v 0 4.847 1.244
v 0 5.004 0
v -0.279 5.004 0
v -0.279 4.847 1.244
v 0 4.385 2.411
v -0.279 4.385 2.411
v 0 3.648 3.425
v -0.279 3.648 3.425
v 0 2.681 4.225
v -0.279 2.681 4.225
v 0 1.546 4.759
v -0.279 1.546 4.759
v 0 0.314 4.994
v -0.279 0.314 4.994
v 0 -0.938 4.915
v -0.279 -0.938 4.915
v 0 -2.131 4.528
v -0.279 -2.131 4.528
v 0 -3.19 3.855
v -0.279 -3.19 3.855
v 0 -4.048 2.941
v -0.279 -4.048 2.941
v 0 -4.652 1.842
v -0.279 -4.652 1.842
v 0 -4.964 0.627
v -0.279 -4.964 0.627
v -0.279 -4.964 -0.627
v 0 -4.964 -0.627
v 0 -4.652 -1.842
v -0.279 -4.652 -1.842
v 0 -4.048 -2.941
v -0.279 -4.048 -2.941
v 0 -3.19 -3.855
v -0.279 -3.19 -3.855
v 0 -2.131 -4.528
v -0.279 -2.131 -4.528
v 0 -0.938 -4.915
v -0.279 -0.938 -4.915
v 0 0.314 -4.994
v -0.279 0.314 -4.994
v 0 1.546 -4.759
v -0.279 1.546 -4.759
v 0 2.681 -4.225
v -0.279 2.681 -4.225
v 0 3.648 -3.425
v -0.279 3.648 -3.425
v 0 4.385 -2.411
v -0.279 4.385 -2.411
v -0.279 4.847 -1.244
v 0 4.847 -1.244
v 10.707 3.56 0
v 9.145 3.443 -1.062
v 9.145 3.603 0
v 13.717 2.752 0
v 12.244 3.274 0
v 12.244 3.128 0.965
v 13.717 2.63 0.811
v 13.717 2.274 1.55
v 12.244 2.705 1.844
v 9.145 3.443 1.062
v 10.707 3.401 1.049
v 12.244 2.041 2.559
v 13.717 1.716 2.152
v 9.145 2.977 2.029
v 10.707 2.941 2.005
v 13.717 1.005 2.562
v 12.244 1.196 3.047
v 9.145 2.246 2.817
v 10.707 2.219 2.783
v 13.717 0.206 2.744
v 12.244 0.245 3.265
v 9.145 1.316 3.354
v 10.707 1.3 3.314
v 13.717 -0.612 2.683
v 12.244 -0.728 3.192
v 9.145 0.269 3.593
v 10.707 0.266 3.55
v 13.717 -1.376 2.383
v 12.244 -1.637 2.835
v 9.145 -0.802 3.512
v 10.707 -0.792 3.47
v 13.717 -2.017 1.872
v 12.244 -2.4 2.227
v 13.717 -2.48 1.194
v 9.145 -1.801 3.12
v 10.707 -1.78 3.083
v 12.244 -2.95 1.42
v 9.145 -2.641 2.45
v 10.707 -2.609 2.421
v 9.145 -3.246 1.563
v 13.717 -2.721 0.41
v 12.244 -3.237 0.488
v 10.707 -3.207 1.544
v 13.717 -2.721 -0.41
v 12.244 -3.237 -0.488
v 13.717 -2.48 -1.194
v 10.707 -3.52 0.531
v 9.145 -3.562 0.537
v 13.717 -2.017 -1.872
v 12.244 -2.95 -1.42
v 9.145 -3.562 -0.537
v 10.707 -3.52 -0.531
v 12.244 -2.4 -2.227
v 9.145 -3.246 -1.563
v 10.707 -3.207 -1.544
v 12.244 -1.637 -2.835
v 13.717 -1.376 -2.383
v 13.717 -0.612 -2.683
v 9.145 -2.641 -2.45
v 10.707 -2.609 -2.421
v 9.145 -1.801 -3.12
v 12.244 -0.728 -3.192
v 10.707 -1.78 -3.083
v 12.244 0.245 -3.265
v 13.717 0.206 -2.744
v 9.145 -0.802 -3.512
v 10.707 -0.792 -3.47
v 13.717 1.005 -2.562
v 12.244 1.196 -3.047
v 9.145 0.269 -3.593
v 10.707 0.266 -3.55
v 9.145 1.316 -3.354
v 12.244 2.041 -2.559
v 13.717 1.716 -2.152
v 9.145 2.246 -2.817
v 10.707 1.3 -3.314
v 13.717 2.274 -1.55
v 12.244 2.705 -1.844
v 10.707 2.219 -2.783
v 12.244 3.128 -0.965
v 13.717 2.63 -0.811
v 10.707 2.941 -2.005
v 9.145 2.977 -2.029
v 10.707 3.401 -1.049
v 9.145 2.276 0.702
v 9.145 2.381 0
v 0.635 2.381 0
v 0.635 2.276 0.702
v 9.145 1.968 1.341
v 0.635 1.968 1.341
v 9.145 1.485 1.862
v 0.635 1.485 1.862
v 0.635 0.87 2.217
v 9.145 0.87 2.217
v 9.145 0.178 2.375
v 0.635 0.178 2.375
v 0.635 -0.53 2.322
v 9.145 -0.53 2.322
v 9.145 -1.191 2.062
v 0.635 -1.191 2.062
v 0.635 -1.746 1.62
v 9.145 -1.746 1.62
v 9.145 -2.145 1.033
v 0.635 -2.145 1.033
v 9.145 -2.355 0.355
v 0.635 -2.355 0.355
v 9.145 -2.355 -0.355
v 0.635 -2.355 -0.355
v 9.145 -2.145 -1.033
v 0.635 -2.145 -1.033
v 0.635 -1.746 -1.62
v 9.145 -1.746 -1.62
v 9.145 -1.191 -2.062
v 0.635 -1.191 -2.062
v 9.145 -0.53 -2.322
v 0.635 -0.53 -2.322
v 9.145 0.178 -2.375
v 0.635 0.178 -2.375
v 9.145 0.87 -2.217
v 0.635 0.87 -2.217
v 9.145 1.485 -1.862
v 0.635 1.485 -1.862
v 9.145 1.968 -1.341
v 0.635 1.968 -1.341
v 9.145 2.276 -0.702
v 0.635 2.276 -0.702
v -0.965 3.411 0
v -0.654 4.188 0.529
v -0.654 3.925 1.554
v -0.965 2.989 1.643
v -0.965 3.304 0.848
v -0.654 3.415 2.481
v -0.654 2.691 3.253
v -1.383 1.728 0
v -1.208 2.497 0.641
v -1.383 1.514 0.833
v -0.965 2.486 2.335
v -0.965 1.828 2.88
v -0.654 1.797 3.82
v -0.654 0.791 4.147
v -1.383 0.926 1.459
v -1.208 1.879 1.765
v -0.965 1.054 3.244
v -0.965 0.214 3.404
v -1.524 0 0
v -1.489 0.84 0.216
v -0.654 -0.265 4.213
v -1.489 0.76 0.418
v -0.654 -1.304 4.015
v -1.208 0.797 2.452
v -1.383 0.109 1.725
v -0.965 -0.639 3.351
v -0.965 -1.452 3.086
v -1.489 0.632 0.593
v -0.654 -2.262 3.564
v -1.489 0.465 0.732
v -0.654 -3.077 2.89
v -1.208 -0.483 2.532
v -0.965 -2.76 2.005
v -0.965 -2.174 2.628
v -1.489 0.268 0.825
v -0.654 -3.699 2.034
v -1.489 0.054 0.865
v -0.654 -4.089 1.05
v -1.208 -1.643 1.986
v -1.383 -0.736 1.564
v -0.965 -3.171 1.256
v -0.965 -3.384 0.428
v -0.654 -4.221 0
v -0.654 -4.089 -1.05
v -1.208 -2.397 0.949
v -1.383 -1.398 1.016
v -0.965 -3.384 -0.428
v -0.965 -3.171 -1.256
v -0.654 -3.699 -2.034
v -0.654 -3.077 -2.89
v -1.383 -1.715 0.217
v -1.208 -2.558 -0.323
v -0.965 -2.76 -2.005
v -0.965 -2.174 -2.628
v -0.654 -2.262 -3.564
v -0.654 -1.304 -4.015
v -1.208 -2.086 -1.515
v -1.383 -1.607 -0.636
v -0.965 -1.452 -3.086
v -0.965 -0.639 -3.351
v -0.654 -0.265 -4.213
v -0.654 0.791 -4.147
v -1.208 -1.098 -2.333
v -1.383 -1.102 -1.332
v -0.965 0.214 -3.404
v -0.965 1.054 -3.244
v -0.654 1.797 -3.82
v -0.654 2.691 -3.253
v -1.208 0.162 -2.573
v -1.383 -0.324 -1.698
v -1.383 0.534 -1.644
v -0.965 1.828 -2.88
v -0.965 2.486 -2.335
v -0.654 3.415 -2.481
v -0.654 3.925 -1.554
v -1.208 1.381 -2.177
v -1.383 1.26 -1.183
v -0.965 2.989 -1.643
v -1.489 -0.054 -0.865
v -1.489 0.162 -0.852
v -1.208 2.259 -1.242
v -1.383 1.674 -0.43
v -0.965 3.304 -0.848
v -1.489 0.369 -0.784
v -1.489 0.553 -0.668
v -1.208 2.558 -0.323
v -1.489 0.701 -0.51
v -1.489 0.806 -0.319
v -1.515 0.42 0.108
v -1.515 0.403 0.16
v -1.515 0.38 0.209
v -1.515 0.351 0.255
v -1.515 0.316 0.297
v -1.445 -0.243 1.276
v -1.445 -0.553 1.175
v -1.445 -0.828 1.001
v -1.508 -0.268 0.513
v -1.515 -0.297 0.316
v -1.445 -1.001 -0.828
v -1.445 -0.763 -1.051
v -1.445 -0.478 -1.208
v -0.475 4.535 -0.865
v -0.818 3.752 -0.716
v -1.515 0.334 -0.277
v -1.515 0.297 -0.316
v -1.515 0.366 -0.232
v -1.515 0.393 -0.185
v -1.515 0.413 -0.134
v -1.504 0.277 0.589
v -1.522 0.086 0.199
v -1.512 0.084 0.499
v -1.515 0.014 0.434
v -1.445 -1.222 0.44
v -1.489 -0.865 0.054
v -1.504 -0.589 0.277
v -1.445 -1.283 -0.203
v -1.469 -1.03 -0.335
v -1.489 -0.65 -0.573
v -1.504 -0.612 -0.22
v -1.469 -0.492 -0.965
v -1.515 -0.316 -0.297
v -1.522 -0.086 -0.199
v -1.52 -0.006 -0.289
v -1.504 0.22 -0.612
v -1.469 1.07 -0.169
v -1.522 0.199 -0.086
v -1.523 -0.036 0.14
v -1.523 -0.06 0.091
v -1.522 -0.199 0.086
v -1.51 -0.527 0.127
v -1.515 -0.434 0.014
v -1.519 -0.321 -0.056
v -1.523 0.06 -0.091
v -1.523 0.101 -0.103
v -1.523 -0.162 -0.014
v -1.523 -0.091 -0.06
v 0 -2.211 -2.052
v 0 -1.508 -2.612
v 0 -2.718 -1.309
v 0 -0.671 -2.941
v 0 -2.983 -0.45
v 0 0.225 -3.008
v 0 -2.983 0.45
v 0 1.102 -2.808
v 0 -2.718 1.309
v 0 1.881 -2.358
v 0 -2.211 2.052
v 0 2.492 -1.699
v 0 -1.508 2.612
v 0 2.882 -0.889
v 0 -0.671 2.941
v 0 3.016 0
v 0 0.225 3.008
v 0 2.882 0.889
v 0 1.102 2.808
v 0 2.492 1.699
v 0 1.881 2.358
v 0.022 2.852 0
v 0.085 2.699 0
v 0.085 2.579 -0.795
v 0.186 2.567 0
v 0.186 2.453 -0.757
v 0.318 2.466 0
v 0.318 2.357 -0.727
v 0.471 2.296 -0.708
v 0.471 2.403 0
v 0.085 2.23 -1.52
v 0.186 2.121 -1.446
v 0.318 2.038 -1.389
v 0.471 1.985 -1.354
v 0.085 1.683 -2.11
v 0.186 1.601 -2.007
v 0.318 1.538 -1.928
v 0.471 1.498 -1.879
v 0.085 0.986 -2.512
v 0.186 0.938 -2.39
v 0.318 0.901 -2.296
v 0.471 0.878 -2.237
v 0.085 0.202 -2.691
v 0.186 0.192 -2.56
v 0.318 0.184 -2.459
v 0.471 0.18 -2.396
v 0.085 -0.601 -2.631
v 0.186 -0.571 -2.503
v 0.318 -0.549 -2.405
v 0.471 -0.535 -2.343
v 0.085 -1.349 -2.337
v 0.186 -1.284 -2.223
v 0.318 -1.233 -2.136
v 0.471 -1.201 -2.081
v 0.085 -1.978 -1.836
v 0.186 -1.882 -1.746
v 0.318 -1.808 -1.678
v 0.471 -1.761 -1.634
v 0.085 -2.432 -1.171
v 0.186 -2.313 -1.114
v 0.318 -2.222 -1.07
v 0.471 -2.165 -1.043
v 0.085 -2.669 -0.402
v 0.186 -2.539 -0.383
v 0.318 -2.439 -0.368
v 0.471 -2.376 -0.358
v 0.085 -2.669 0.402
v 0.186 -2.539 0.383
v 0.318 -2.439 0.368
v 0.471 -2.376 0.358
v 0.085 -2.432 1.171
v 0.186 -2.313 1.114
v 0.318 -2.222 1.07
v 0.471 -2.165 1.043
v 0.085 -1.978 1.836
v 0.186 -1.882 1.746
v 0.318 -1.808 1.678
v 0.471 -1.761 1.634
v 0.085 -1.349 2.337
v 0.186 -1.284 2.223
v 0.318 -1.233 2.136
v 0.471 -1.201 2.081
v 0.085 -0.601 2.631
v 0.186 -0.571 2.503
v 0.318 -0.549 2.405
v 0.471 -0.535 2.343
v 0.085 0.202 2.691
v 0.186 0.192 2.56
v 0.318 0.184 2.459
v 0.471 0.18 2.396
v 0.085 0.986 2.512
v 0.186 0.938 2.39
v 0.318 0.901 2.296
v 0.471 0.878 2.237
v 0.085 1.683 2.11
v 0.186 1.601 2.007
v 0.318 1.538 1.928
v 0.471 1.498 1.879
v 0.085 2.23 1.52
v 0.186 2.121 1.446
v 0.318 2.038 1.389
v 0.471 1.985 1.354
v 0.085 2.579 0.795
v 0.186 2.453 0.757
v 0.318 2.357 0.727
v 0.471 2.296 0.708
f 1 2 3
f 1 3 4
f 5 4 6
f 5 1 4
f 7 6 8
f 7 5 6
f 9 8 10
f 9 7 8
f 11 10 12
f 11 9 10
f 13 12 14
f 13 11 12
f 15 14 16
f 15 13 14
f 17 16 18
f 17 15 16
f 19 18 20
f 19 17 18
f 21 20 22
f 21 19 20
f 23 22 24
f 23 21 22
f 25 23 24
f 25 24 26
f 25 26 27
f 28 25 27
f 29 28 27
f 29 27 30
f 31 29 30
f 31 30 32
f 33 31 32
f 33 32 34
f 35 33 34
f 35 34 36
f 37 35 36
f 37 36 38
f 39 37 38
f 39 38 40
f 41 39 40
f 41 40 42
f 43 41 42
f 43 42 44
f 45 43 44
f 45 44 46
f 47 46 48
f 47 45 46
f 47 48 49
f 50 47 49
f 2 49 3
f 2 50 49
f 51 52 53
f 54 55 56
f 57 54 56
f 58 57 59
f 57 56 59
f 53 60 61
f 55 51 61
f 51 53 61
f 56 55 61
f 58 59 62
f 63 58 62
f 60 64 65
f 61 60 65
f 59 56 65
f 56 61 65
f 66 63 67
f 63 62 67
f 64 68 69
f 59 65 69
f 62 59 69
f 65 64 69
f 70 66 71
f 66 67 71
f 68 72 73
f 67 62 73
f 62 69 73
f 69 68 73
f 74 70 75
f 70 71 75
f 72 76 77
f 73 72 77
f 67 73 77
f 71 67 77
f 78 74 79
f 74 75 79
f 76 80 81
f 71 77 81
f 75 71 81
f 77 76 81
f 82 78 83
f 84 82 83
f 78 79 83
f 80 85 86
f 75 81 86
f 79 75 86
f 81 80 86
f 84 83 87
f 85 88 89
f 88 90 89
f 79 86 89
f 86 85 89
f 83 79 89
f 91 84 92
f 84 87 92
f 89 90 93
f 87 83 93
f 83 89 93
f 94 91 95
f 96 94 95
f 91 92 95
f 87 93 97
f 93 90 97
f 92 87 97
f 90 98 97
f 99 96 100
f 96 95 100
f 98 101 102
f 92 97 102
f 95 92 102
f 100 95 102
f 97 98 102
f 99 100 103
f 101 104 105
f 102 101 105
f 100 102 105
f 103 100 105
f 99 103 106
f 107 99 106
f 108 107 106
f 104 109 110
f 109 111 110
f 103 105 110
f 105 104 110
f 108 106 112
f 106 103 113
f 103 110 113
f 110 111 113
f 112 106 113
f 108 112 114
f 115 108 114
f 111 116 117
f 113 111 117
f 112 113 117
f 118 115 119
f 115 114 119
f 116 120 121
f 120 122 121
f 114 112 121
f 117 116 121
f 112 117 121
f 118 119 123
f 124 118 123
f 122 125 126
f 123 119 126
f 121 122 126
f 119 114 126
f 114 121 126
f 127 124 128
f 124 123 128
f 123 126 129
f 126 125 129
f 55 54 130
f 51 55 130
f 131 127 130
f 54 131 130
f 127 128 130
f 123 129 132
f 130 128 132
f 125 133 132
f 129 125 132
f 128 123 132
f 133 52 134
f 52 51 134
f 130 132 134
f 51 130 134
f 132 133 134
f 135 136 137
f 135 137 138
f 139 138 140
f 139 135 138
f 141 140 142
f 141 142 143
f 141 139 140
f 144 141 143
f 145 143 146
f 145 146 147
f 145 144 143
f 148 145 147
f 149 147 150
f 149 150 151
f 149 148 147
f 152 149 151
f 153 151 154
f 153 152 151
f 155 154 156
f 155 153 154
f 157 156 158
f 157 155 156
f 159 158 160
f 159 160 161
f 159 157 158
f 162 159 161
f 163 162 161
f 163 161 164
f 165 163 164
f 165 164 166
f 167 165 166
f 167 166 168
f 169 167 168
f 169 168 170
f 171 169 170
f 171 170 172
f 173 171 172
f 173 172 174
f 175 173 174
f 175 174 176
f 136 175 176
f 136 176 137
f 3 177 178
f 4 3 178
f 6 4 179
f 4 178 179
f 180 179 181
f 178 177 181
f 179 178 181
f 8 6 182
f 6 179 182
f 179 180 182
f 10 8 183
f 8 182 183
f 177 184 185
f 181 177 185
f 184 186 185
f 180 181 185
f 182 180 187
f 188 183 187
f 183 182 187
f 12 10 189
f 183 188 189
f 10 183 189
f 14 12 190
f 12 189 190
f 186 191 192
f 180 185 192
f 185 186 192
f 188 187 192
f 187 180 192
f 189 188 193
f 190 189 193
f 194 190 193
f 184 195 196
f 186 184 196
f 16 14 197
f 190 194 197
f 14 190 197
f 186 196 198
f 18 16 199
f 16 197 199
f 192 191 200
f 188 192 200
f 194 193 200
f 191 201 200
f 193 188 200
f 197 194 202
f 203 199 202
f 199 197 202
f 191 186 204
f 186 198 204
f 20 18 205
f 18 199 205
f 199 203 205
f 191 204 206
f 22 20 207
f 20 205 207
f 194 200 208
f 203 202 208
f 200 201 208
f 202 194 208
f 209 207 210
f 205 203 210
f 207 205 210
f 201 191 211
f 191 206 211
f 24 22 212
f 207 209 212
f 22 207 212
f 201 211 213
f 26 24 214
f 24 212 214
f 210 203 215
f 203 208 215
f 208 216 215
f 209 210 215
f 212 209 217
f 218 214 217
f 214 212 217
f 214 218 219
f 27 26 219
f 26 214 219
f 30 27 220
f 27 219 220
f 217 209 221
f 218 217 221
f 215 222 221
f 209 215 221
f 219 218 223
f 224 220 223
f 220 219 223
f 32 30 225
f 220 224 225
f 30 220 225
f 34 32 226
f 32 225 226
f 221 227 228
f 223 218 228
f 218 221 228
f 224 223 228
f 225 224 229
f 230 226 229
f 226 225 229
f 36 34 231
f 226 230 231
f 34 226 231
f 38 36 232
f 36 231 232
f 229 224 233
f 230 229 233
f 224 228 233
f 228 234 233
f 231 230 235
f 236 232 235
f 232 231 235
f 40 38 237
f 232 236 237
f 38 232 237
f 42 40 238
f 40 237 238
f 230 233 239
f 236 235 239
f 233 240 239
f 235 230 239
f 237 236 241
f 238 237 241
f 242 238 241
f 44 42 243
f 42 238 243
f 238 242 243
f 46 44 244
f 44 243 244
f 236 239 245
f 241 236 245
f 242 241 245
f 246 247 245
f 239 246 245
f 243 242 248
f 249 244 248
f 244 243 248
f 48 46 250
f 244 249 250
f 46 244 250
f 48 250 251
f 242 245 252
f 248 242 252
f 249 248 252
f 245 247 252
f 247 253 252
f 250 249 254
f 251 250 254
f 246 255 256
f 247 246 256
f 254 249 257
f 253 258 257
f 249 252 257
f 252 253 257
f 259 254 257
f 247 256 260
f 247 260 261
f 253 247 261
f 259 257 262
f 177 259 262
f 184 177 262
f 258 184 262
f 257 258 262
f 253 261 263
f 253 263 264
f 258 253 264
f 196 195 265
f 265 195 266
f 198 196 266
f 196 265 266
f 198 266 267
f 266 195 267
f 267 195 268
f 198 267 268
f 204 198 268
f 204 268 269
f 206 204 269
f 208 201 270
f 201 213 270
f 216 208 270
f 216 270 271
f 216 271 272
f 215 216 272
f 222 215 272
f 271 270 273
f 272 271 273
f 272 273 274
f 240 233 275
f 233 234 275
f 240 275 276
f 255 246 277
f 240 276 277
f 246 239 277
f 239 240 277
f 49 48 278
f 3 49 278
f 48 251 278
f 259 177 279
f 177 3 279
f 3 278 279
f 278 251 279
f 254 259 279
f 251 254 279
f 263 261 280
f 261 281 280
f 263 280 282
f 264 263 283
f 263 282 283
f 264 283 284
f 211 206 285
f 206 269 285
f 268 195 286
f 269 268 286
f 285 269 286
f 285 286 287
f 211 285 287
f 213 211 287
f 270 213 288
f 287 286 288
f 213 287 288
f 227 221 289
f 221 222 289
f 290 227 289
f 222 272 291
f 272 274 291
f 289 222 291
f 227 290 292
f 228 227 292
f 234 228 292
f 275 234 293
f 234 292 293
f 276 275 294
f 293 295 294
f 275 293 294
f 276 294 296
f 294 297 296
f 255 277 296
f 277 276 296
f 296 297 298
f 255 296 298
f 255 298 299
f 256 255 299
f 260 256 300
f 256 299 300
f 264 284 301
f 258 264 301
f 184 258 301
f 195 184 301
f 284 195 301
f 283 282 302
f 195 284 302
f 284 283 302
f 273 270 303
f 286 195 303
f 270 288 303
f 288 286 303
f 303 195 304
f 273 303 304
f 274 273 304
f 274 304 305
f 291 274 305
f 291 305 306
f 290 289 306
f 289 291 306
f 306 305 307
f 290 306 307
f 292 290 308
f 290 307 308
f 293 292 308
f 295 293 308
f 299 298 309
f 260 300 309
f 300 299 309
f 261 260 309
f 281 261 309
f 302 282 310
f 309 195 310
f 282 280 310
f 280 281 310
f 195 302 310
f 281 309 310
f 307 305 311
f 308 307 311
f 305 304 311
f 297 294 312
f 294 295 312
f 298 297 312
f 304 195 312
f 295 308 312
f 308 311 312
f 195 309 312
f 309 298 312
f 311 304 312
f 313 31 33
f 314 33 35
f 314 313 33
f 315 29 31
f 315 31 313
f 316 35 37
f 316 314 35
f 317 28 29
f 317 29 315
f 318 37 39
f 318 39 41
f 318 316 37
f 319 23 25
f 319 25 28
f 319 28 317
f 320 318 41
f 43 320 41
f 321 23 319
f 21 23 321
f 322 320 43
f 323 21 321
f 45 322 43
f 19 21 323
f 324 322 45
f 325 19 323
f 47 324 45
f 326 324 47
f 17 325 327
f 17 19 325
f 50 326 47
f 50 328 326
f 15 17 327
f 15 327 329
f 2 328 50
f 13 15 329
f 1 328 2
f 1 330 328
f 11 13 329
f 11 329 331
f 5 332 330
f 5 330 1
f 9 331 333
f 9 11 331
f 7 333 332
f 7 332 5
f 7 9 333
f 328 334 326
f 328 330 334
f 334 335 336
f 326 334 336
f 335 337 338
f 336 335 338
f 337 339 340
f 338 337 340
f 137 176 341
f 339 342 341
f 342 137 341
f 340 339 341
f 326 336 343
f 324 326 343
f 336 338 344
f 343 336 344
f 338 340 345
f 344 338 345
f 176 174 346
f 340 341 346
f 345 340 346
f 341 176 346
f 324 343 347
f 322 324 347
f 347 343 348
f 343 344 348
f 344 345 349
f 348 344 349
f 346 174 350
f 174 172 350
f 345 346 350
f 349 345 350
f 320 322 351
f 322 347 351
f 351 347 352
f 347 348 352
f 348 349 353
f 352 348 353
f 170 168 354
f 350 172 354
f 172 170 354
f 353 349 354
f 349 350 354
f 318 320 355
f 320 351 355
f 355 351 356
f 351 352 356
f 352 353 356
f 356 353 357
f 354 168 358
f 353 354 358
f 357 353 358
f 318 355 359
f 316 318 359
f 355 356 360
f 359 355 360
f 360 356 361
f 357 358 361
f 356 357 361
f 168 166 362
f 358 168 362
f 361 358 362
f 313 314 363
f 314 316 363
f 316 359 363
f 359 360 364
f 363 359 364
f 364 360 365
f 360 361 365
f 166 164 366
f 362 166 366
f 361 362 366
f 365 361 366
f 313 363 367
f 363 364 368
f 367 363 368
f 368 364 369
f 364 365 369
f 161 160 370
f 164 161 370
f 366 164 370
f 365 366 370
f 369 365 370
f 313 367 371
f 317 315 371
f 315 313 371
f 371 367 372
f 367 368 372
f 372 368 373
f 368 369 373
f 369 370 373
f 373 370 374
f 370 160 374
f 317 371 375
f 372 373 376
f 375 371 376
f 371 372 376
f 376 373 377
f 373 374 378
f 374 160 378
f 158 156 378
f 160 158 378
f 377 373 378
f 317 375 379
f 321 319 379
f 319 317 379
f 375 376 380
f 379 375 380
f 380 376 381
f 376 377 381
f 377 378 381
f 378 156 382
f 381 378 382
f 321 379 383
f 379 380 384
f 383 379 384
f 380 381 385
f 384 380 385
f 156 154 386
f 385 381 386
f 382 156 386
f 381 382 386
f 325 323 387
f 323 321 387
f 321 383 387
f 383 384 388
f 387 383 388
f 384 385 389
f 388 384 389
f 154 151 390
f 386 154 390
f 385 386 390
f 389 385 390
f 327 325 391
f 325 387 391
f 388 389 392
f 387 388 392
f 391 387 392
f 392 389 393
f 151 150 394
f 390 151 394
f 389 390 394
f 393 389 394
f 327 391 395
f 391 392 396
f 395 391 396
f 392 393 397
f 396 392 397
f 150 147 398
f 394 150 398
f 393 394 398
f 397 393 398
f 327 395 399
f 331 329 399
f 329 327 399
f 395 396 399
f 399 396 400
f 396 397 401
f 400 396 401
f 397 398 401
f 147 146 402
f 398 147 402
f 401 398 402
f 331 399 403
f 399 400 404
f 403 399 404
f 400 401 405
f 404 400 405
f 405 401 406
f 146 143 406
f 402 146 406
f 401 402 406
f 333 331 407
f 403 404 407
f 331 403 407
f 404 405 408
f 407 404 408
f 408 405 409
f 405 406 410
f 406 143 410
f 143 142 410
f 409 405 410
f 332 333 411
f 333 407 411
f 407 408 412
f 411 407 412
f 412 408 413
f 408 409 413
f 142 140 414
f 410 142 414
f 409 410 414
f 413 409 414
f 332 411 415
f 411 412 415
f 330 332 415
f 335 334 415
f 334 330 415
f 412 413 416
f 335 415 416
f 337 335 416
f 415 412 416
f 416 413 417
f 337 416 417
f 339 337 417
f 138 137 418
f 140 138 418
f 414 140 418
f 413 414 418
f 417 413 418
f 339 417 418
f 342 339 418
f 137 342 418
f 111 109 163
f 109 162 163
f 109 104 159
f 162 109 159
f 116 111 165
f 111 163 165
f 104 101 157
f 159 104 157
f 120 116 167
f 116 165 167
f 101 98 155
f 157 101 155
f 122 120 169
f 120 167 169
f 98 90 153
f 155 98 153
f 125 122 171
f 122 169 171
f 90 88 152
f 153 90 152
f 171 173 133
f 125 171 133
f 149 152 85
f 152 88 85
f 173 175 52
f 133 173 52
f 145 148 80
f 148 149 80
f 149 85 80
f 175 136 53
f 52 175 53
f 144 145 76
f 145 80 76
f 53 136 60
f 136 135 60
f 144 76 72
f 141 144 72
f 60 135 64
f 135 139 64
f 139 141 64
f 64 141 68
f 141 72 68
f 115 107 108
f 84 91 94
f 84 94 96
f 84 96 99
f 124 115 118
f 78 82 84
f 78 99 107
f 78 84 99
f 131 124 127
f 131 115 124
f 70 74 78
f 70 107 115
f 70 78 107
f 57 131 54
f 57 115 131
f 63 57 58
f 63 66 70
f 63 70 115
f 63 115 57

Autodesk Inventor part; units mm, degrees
ref_plane "YZ Plane" through (0, 0, 0) normal (1, 0, 0) x (0, 1, 0)
ref_plane "XZ Plane" through (0, 0, 0) normal (0, 1, 0) x (-1, 0, 0)
ref_plane "XY Plane" through (0, 0, 0) normal (0, 0, 1) x (1, 0, 0)
sketch "Sketch1" plane through (0, 0, 0) normal (0, 0, 1) x (1, 0, 0)
  line L0 (-0.2794, 5.0038) -> (0, 5.0038)
  line L1 (0, 5.0038) -> (0, 2.3813)
  line L2 (0, 2.3813) -> (9.145, 2.3813)
  line L3 (9.145, 2.3813) -> (9.145, 3.6027)
  line L4 (-1.524, 0) -> (13.717, 0)
  arc A0 (-0.2794, 5.0038) -> (-1.524, 0) centre (9.157, 0) ccw
  line L5 (13.717, 0) -> (13.717, 2.7521)
  arc A1 (13.717, 2.7521) -> (9.145, 3.6027) centre (9.6505, -6.3921) ccw
  line L6 (-2.918, 0) -> (6.7593, 0) projected
  line L7 (0, -5.4716) -> (0, 4.7514) projected
  dimension "d0" = 10.0076
  dimension "d1" = 4.7625
  dimension "d2" = 7.2055
  dimension "d3" = 5.5042
  dimension "d4" = 10.0076
  dimension "d5" = 4.572
  dimension "d6" = 9.145
  dimension "d7" = 0.2794
  dimension "d8" = 1.524
revolve "Body" add sketch "Sketch1" angle 360 about axis through (-1.524, 0, 0) along (1, 0, 0)
fillet "Fillet1" radius 0.635 1 edges at (0, -2.3812, 0)
equation "\"d10\" = R1"
equation "\"d0\" = KOD"
equation "\"d1\" = NND"
equation "\"d2\" = 0.72 * KOD"
equation "\"d3\" = 0.55 * KOD"
equation "\"d4\" = KOD"
equation "\"d5\" = 3 * KOH"
equation "\"d7\" = PHH"
equation "\"d8\" = KOH"
equation "\"NND\" = 4.7625"
equation "\"KLG\" = 9.144"
equation "\"KOH\" = 1.524"
equation "\"KOD\" = 10.0076"
equation "\"PHH\" = 0.2794"
equation "\"R1\" = 0.635"
equation "\"BOR\" = 2.8956"
equation "\"KLGMAX\" = 9.525"
equation "\"KLGMIN\" = 6.3754"
properties part number "IFI 114 - 66" material "Steel, Mild"
